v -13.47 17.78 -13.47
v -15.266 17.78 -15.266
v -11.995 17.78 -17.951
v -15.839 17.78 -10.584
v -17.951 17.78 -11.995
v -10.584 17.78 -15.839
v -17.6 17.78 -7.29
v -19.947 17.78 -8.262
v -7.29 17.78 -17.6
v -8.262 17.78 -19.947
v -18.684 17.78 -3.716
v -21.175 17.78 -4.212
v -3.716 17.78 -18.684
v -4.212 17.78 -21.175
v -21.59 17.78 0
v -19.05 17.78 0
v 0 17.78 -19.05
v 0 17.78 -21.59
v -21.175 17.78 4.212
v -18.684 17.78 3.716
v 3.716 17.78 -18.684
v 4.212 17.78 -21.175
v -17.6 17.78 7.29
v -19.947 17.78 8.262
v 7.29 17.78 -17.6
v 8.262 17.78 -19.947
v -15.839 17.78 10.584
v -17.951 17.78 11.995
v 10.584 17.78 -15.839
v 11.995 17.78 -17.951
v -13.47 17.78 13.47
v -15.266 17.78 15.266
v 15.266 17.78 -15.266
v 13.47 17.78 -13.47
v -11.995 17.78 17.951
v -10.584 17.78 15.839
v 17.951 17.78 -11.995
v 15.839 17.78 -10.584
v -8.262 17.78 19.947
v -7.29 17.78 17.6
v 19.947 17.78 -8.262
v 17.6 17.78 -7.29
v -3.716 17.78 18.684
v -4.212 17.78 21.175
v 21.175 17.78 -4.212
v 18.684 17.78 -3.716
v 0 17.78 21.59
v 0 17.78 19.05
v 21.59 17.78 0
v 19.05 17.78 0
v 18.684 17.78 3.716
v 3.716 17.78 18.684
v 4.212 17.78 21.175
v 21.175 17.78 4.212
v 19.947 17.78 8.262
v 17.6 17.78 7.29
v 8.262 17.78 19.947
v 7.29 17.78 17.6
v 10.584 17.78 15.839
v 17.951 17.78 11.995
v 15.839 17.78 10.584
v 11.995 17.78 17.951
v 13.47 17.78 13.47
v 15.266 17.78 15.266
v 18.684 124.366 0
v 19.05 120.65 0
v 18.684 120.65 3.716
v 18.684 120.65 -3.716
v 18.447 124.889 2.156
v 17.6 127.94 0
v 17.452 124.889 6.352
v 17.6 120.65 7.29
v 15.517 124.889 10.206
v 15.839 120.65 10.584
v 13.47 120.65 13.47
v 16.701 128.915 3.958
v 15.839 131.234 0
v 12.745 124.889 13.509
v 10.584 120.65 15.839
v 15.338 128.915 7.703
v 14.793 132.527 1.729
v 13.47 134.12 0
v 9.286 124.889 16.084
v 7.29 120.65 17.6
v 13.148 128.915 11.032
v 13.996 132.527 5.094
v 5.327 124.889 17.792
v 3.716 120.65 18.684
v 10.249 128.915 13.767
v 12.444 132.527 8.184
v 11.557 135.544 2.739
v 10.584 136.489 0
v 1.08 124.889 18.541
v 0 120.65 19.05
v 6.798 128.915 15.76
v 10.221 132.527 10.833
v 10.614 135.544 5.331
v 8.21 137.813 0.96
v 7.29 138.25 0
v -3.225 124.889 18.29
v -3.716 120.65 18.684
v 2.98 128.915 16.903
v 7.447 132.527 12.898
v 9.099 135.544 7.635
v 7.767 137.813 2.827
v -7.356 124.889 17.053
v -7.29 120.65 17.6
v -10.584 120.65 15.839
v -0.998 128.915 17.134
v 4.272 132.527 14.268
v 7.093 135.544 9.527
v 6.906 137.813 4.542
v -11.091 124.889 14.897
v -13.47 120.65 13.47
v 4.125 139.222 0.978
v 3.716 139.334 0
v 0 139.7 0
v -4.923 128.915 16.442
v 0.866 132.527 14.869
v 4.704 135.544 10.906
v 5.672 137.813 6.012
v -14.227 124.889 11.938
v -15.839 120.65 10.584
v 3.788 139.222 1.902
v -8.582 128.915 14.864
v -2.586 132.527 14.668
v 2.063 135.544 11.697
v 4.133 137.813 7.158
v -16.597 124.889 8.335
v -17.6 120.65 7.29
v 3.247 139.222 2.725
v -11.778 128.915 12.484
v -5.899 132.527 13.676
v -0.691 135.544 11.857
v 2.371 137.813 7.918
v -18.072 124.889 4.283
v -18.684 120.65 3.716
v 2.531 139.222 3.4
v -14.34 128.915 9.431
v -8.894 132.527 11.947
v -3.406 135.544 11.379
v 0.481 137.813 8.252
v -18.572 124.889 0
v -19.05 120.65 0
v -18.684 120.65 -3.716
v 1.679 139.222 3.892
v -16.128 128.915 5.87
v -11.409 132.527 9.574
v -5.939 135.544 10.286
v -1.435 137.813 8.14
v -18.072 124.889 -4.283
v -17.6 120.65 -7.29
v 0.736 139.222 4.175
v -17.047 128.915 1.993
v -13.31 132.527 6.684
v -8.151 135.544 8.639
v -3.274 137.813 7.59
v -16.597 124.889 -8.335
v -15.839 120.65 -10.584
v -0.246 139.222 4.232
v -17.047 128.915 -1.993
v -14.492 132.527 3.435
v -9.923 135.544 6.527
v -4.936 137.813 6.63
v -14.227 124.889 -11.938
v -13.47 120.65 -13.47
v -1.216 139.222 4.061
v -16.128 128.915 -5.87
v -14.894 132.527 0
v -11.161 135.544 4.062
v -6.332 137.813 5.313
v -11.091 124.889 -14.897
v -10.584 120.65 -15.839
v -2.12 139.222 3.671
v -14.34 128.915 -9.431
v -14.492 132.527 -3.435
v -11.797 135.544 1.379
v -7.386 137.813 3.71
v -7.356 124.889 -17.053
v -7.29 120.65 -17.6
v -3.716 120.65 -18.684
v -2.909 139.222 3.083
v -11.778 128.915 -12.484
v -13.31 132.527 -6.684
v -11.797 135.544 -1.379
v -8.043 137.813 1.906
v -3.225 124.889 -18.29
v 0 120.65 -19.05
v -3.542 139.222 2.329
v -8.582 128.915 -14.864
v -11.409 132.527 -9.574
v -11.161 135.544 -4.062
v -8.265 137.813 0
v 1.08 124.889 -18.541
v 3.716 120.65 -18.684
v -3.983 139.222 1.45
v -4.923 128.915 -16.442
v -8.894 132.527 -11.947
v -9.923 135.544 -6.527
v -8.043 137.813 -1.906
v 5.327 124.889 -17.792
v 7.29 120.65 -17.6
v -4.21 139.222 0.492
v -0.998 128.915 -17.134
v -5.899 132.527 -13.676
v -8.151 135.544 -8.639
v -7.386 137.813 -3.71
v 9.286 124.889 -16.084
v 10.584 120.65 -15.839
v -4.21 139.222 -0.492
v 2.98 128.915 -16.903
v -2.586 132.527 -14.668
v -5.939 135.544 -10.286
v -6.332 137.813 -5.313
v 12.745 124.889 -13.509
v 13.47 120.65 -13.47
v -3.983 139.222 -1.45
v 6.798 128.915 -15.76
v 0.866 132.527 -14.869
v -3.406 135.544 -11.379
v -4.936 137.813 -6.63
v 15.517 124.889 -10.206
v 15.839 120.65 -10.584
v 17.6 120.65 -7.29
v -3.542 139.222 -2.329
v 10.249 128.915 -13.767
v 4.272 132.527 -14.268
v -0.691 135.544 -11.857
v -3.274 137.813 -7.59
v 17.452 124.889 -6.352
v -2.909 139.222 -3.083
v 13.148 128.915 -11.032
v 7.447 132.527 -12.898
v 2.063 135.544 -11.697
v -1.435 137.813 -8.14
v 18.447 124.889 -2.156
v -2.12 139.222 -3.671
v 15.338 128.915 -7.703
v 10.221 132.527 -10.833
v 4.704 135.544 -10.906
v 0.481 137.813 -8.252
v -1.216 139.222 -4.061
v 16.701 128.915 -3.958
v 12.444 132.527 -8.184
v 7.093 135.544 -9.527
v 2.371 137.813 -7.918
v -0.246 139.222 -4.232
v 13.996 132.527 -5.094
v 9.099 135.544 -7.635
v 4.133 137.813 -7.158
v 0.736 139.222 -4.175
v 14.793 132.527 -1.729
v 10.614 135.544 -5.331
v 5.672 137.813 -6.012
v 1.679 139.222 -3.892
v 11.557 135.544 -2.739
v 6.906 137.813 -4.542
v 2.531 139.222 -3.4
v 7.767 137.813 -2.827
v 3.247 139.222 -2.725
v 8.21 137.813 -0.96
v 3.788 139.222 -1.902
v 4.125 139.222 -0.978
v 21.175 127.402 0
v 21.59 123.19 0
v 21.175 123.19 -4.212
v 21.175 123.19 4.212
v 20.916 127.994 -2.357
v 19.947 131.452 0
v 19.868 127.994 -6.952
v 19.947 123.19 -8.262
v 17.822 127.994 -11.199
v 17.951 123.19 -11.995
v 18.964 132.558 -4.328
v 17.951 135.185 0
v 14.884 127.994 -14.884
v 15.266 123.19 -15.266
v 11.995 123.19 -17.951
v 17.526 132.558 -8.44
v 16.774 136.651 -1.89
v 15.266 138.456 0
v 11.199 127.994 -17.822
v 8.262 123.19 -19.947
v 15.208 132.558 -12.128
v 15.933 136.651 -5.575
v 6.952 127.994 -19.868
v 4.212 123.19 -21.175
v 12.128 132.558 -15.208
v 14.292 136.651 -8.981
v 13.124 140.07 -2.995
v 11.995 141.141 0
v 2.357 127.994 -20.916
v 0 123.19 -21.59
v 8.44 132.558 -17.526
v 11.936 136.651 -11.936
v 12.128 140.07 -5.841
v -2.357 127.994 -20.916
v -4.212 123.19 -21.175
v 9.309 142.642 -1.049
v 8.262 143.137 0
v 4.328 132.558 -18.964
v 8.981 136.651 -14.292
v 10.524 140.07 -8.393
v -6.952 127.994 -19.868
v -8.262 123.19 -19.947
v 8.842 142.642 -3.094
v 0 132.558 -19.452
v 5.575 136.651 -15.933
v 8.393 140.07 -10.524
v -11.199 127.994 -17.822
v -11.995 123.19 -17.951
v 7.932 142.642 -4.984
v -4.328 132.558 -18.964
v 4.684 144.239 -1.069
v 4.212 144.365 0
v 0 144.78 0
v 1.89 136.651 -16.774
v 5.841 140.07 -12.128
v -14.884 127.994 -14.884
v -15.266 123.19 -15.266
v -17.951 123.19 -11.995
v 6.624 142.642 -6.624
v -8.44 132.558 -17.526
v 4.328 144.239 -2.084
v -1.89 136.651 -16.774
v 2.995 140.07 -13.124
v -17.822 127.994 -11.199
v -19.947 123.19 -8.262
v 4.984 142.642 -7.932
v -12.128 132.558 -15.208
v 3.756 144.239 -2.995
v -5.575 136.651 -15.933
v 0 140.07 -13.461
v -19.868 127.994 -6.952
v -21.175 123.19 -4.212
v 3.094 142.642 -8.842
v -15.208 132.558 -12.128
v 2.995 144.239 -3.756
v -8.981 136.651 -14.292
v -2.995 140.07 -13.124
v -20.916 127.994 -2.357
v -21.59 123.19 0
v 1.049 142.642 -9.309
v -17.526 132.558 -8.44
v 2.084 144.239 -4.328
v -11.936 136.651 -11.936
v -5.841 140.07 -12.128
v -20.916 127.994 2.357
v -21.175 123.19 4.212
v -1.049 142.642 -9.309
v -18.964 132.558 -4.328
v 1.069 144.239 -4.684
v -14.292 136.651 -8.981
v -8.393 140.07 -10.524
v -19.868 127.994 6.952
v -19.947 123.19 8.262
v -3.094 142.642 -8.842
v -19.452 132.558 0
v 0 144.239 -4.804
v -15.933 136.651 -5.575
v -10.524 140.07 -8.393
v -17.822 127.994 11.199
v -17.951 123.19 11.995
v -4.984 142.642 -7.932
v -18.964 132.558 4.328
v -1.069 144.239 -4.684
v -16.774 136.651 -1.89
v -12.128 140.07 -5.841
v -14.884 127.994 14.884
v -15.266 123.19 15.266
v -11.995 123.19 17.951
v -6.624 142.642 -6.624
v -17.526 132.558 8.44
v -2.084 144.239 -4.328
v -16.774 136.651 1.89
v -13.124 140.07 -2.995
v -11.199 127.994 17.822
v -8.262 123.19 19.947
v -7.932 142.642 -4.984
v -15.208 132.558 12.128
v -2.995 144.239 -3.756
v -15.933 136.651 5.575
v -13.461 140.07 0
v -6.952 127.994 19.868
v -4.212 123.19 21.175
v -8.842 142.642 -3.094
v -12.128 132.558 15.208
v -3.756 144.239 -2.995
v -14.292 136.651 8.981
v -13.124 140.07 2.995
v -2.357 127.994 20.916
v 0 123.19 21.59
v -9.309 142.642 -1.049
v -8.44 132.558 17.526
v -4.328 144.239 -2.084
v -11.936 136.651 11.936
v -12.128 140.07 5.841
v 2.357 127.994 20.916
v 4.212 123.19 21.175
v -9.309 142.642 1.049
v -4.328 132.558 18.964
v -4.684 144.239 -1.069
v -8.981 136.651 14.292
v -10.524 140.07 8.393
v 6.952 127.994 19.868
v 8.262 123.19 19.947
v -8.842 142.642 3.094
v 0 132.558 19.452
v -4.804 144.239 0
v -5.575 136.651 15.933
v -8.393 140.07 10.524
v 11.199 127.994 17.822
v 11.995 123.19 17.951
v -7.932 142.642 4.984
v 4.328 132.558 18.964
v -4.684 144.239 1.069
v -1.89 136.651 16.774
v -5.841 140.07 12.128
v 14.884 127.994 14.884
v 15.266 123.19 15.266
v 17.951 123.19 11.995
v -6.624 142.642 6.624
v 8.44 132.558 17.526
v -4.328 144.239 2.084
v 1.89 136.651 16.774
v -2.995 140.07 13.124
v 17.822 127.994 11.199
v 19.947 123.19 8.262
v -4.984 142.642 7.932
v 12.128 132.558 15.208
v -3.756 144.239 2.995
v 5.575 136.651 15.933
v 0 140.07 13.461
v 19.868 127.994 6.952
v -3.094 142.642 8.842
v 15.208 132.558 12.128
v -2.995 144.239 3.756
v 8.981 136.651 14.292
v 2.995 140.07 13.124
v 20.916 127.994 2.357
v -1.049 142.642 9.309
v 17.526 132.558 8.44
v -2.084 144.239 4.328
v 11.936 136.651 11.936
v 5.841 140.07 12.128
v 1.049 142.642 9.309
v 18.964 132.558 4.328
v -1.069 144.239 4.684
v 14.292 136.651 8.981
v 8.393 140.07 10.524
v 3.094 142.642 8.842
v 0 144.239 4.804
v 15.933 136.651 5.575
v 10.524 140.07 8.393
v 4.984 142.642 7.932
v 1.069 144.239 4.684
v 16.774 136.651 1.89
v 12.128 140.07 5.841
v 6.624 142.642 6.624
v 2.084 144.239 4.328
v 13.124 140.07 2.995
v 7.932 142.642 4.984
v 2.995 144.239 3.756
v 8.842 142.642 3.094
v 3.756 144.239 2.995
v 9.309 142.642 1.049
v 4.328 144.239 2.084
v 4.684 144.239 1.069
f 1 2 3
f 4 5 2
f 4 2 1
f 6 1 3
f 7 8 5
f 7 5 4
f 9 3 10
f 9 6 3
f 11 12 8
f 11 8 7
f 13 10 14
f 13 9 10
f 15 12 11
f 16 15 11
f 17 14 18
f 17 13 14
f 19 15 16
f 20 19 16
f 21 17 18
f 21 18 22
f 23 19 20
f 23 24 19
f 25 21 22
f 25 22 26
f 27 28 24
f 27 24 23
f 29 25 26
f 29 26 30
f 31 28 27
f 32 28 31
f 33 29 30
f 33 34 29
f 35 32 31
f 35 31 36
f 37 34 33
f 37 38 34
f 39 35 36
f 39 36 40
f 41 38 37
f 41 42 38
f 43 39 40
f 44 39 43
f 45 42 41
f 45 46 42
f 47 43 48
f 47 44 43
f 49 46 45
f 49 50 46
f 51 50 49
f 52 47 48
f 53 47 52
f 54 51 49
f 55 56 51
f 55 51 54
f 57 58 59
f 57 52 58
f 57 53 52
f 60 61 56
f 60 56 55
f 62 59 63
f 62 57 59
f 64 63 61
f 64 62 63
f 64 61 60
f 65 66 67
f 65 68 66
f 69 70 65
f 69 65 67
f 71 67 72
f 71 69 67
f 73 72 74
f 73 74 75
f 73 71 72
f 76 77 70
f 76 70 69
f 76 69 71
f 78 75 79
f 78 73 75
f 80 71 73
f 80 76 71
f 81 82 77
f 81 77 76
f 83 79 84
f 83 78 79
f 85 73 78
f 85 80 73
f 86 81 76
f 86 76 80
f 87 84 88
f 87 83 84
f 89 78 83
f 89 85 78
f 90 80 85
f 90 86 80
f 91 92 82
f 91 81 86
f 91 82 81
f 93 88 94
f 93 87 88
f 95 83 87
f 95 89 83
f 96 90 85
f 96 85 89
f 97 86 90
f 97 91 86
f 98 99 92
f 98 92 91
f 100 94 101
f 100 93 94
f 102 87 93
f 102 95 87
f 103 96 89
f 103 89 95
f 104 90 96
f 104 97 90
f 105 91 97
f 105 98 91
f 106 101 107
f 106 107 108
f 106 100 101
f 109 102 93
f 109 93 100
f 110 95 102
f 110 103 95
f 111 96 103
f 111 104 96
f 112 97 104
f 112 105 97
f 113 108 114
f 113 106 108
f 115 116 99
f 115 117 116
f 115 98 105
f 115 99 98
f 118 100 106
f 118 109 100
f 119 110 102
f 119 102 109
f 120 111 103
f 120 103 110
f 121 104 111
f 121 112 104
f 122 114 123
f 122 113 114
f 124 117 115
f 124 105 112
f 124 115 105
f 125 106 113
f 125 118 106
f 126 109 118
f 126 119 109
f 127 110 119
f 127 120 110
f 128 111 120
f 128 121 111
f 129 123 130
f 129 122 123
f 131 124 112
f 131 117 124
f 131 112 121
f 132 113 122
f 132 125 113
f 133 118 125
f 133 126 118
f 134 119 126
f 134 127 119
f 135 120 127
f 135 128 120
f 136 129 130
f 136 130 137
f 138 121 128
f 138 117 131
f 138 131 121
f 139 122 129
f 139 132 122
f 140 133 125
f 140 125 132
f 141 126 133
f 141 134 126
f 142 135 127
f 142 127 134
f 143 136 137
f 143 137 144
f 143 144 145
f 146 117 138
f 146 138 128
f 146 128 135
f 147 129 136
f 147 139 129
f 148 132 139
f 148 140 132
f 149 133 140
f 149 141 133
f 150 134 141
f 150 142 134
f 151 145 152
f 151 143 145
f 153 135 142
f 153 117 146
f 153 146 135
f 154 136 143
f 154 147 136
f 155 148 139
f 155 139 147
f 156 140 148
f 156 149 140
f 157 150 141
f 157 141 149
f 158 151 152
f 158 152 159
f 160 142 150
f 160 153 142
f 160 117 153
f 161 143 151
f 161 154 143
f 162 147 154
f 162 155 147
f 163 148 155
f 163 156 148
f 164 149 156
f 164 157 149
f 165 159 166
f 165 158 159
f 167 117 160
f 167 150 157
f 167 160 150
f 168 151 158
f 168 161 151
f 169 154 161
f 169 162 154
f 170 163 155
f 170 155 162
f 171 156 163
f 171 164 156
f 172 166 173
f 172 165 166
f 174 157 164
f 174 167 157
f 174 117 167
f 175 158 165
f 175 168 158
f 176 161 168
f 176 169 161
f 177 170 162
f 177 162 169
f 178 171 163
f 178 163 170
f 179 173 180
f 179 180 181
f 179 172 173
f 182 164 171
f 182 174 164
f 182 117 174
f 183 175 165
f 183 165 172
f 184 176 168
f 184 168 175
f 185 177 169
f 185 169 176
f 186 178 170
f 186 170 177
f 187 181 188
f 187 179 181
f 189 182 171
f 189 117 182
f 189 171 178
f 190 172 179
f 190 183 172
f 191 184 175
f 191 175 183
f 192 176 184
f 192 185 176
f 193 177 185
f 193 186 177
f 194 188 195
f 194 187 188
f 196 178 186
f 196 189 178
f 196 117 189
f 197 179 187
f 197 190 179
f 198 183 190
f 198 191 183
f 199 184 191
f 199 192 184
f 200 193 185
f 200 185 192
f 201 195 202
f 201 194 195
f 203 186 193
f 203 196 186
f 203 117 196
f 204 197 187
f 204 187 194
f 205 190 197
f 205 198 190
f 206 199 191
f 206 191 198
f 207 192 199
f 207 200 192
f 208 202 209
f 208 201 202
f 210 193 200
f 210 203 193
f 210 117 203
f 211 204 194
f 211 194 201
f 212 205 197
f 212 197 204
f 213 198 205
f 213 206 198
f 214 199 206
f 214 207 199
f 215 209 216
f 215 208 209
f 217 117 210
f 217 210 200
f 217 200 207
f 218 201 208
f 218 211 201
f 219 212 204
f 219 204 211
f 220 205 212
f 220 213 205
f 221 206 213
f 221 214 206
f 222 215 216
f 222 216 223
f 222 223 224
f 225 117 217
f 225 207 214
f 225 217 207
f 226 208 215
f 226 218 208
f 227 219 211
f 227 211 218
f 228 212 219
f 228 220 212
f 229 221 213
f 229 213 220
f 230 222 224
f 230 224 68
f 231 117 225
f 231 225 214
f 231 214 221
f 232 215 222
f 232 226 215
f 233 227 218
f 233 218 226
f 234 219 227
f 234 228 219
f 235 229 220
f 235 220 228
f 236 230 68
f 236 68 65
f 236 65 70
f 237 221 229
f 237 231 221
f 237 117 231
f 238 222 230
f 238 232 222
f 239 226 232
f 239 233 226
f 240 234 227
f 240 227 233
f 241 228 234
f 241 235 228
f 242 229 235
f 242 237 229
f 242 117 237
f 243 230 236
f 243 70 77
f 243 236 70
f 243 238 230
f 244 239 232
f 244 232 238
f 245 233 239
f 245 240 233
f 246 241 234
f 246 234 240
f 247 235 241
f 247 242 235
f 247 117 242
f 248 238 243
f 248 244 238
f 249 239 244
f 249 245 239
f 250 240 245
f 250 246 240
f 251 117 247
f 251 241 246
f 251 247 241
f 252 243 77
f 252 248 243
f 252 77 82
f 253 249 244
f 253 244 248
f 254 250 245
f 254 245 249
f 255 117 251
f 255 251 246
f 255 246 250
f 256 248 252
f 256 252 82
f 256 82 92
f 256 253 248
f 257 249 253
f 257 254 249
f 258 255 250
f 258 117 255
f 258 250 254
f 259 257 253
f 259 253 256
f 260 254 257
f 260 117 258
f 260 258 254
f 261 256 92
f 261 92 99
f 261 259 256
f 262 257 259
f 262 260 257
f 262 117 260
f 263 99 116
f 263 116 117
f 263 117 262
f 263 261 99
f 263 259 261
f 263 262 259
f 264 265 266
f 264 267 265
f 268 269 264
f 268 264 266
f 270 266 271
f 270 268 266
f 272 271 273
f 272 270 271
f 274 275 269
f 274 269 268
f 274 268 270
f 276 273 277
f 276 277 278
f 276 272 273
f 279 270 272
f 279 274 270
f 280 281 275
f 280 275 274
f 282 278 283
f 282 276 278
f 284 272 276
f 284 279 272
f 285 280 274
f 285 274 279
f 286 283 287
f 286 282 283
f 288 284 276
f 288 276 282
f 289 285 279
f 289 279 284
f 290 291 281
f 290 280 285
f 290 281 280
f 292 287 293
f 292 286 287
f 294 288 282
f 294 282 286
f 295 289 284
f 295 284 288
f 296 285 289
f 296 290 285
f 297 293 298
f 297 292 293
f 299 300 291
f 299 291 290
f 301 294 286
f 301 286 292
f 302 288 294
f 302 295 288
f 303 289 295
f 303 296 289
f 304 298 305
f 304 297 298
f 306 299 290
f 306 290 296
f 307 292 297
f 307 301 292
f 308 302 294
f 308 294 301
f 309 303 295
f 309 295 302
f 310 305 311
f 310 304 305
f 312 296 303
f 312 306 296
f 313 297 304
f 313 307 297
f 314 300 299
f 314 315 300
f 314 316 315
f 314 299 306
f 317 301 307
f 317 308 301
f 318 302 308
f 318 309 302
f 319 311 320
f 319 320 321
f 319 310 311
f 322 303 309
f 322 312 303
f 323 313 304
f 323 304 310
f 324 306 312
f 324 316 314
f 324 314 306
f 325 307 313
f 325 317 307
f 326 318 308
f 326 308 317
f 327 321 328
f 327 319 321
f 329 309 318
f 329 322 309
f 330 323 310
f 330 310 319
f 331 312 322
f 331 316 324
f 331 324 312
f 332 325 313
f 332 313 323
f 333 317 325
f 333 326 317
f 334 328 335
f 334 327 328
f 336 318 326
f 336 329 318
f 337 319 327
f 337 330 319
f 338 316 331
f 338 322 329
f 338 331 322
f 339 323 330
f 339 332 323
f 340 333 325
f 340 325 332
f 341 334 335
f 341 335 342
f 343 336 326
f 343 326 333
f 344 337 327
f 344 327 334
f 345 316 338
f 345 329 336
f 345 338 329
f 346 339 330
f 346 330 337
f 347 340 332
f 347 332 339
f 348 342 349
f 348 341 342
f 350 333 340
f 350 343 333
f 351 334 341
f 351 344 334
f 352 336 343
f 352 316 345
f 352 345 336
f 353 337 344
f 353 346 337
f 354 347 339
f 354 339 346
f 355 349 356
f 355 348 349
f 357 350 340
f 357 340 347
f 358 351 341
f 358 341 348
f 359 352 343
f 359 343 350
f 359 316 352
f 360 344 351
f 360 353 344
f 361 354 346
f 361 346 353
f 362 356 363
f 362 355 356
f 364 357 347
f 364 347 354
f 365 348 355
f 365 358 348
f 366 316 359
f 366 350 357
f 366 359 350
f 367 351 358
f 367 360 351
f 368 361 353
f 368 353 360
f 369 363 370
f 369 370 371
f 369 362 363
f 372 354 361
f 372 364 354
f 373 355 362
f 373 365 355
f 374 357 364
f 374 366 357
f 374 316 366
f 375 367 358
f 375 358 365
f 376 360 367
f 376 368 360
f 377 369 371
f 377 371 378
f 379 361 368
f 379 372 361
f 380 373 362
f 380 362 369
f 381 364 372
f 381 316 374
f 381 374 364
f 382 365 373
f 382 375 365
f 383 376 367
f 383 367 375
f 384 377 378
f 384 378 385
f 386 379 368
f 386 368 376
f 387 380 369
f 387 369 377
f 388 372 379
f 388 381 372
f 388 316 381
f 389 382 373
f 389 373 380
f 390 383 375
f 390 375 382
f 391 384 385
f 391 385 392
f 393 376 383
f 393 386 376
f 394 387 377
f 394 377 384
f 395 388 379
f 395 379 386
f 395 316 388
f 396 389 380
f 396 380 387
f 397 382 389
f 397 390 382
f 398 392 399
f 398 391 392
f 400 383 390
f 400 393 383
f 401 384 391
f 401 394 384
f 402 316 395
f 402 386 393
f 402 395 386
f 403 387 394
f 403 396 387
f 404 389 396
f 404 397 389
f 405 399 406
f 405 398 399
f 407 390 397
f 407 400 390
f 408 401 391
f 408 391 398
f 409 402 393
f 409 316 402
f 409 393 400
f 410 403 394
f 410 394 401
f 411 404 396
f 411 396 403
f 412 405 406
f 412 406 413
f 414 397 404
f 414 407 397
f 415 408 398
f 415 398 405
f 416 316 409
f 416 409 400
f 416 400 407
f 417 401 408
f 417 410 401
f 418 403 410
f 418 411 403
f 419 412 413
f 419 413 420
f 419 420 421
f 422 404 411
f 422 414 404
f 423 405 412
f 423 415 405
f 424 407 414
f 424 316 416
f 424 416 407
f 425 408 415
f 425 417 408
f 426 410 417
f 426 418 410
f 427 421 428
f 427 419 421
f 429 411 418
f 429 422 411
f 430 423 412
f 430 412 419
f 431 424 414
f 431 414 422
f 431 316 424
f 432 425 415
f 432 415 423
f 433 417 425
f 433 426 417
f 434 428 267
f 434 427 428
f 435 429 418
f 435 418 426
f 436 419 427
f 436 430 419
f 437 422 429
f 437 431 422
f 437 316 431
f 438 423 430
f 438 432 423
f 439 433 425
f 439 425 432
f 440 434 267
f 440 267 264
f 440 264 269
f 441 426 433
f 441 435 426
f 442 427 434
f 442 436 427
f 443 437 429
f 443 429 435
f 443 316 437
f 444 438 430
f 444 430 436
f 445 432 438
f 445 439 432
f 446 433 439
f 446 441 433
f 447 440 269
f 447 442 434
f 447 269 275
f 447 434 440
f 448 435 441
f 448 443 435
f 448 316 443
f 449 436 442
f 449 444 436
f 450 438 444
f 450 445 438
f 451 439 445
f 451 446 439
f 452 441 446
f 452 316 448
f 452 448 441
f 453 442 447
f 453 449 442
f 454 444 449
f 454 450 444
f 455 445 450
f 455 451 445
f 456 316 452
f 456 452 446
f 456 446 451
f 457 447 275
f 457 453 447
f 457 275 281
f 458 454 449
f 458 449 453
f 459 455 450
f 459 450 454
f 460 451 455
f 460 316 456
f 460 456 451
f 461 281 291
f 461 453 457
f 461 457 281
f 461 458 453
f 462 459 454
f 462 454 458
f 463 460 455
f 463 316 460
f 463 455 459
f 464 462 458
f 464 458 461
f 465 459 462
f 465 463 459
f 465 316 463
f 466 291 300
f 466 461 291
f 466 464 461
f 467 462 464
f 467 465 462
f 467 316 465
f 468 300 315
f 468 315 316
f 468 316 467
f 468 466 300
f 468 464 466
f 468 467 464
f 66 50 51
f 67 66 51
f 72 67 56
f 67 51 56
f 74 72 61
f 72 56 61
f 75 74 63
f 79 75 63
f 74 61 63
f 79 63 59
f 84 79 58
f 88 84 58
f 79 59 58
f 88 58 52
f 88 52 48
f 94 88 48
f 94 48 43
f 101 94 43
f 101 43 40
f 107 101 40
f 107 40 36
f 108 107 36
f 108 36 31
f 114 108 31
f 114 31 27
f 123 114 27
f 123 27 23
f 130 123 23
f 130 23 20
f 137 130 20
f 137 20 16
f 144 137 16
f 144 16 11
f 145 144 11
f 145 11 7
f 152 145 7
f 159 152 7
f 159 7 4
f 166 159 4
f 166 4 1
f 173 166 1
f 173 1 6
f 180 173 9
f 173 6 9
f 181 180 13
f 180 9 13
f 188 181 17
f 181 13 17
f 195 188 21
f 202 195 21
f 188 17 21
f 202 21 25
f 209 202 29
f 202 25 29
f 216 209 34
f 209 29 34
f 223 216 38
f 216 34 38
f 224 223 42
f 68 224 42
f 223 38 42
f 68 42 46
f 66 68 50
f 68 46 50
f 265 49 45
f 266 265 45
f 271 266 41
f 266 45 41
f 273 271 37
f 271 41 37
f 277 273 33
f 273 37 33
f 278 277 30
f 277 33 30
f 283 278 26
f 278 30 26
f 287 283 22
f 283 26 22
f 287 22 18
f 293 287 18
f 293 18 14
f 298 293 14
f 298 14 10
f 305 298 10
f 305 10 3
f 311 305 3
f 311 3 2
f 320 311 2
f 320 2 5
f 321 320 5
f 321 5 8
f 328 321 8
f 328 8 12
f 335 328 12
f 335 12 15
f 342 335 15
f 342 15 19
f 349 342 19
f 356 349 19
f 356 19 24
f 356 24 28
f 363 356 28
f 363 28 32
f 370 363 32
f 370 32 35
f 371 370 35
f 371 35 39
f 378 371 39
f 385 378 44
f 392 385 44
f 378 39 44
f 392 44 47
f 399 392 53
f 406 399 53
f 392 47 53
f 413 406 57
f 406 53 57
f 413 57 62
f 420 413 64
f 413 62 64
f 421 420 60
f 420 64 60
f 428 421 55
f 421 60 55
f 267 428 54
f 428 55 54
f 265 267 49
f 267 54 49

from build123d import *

# Parameters (mm, degrees)
SKETCH2_R           = 21.59
BOSS_EXTRUDE1_DEPTH = 144.78
SKETCH3_R           = 19.05
CUT_EXTRUDE1_DEPTH  = 139.7
FILLET1_R           = 21.59
FILLET2_R           = 19.05
SKETCH4_R           = 21.59
CUT_EXTRUDE2_DEPTH  = 17.78


with BuildPart() as part:
    # Sketch2 → Boss-Extrude1 (new body)
    with BuildSketch(Plane(origin=(0, 0, 0), x_dir=(1, 0, 0), z_dir=(0, 1, 0))):
        Circle(SKETCH2_R)
    extrude(amount=BOSS_EXTRUDE1_DEPTH)

    # Sketch3 → Cut-Extrude1 (cut)
    with BuildSketch(Plane.XZ):
        Circle(SKETCH3_R)
    extrude(amount=-CUT_EXTRUDE1_DEPTH, mode=Mode.SUBTRACT)

    # Fillet1
    fillet1_edges = [part.edges().sort_by_distance(p)[0] for p in [
        (-21.59, 144.78, 0),
    ]]
    fillet(fillet1_edges, radius=FILLET1_R)

    # Fillet2
    fillet2_edges = [part.edges().sort_by_distance(p)[0] for p in [
        (-19.05, 139.7, 0),
    ]]
    fillet(fillet2_edges, radius=FILLET2_R)

    # Sketch4 → Cut-Extrude2 (cut)
    with BuildSketch(Plane.XZ):
        Circle(SKETCH4_R)
    extrude(amount=-CUT_EXTRUDE2_DEPTH, mode=Mode.SUBTRACT)


solid = part.part
